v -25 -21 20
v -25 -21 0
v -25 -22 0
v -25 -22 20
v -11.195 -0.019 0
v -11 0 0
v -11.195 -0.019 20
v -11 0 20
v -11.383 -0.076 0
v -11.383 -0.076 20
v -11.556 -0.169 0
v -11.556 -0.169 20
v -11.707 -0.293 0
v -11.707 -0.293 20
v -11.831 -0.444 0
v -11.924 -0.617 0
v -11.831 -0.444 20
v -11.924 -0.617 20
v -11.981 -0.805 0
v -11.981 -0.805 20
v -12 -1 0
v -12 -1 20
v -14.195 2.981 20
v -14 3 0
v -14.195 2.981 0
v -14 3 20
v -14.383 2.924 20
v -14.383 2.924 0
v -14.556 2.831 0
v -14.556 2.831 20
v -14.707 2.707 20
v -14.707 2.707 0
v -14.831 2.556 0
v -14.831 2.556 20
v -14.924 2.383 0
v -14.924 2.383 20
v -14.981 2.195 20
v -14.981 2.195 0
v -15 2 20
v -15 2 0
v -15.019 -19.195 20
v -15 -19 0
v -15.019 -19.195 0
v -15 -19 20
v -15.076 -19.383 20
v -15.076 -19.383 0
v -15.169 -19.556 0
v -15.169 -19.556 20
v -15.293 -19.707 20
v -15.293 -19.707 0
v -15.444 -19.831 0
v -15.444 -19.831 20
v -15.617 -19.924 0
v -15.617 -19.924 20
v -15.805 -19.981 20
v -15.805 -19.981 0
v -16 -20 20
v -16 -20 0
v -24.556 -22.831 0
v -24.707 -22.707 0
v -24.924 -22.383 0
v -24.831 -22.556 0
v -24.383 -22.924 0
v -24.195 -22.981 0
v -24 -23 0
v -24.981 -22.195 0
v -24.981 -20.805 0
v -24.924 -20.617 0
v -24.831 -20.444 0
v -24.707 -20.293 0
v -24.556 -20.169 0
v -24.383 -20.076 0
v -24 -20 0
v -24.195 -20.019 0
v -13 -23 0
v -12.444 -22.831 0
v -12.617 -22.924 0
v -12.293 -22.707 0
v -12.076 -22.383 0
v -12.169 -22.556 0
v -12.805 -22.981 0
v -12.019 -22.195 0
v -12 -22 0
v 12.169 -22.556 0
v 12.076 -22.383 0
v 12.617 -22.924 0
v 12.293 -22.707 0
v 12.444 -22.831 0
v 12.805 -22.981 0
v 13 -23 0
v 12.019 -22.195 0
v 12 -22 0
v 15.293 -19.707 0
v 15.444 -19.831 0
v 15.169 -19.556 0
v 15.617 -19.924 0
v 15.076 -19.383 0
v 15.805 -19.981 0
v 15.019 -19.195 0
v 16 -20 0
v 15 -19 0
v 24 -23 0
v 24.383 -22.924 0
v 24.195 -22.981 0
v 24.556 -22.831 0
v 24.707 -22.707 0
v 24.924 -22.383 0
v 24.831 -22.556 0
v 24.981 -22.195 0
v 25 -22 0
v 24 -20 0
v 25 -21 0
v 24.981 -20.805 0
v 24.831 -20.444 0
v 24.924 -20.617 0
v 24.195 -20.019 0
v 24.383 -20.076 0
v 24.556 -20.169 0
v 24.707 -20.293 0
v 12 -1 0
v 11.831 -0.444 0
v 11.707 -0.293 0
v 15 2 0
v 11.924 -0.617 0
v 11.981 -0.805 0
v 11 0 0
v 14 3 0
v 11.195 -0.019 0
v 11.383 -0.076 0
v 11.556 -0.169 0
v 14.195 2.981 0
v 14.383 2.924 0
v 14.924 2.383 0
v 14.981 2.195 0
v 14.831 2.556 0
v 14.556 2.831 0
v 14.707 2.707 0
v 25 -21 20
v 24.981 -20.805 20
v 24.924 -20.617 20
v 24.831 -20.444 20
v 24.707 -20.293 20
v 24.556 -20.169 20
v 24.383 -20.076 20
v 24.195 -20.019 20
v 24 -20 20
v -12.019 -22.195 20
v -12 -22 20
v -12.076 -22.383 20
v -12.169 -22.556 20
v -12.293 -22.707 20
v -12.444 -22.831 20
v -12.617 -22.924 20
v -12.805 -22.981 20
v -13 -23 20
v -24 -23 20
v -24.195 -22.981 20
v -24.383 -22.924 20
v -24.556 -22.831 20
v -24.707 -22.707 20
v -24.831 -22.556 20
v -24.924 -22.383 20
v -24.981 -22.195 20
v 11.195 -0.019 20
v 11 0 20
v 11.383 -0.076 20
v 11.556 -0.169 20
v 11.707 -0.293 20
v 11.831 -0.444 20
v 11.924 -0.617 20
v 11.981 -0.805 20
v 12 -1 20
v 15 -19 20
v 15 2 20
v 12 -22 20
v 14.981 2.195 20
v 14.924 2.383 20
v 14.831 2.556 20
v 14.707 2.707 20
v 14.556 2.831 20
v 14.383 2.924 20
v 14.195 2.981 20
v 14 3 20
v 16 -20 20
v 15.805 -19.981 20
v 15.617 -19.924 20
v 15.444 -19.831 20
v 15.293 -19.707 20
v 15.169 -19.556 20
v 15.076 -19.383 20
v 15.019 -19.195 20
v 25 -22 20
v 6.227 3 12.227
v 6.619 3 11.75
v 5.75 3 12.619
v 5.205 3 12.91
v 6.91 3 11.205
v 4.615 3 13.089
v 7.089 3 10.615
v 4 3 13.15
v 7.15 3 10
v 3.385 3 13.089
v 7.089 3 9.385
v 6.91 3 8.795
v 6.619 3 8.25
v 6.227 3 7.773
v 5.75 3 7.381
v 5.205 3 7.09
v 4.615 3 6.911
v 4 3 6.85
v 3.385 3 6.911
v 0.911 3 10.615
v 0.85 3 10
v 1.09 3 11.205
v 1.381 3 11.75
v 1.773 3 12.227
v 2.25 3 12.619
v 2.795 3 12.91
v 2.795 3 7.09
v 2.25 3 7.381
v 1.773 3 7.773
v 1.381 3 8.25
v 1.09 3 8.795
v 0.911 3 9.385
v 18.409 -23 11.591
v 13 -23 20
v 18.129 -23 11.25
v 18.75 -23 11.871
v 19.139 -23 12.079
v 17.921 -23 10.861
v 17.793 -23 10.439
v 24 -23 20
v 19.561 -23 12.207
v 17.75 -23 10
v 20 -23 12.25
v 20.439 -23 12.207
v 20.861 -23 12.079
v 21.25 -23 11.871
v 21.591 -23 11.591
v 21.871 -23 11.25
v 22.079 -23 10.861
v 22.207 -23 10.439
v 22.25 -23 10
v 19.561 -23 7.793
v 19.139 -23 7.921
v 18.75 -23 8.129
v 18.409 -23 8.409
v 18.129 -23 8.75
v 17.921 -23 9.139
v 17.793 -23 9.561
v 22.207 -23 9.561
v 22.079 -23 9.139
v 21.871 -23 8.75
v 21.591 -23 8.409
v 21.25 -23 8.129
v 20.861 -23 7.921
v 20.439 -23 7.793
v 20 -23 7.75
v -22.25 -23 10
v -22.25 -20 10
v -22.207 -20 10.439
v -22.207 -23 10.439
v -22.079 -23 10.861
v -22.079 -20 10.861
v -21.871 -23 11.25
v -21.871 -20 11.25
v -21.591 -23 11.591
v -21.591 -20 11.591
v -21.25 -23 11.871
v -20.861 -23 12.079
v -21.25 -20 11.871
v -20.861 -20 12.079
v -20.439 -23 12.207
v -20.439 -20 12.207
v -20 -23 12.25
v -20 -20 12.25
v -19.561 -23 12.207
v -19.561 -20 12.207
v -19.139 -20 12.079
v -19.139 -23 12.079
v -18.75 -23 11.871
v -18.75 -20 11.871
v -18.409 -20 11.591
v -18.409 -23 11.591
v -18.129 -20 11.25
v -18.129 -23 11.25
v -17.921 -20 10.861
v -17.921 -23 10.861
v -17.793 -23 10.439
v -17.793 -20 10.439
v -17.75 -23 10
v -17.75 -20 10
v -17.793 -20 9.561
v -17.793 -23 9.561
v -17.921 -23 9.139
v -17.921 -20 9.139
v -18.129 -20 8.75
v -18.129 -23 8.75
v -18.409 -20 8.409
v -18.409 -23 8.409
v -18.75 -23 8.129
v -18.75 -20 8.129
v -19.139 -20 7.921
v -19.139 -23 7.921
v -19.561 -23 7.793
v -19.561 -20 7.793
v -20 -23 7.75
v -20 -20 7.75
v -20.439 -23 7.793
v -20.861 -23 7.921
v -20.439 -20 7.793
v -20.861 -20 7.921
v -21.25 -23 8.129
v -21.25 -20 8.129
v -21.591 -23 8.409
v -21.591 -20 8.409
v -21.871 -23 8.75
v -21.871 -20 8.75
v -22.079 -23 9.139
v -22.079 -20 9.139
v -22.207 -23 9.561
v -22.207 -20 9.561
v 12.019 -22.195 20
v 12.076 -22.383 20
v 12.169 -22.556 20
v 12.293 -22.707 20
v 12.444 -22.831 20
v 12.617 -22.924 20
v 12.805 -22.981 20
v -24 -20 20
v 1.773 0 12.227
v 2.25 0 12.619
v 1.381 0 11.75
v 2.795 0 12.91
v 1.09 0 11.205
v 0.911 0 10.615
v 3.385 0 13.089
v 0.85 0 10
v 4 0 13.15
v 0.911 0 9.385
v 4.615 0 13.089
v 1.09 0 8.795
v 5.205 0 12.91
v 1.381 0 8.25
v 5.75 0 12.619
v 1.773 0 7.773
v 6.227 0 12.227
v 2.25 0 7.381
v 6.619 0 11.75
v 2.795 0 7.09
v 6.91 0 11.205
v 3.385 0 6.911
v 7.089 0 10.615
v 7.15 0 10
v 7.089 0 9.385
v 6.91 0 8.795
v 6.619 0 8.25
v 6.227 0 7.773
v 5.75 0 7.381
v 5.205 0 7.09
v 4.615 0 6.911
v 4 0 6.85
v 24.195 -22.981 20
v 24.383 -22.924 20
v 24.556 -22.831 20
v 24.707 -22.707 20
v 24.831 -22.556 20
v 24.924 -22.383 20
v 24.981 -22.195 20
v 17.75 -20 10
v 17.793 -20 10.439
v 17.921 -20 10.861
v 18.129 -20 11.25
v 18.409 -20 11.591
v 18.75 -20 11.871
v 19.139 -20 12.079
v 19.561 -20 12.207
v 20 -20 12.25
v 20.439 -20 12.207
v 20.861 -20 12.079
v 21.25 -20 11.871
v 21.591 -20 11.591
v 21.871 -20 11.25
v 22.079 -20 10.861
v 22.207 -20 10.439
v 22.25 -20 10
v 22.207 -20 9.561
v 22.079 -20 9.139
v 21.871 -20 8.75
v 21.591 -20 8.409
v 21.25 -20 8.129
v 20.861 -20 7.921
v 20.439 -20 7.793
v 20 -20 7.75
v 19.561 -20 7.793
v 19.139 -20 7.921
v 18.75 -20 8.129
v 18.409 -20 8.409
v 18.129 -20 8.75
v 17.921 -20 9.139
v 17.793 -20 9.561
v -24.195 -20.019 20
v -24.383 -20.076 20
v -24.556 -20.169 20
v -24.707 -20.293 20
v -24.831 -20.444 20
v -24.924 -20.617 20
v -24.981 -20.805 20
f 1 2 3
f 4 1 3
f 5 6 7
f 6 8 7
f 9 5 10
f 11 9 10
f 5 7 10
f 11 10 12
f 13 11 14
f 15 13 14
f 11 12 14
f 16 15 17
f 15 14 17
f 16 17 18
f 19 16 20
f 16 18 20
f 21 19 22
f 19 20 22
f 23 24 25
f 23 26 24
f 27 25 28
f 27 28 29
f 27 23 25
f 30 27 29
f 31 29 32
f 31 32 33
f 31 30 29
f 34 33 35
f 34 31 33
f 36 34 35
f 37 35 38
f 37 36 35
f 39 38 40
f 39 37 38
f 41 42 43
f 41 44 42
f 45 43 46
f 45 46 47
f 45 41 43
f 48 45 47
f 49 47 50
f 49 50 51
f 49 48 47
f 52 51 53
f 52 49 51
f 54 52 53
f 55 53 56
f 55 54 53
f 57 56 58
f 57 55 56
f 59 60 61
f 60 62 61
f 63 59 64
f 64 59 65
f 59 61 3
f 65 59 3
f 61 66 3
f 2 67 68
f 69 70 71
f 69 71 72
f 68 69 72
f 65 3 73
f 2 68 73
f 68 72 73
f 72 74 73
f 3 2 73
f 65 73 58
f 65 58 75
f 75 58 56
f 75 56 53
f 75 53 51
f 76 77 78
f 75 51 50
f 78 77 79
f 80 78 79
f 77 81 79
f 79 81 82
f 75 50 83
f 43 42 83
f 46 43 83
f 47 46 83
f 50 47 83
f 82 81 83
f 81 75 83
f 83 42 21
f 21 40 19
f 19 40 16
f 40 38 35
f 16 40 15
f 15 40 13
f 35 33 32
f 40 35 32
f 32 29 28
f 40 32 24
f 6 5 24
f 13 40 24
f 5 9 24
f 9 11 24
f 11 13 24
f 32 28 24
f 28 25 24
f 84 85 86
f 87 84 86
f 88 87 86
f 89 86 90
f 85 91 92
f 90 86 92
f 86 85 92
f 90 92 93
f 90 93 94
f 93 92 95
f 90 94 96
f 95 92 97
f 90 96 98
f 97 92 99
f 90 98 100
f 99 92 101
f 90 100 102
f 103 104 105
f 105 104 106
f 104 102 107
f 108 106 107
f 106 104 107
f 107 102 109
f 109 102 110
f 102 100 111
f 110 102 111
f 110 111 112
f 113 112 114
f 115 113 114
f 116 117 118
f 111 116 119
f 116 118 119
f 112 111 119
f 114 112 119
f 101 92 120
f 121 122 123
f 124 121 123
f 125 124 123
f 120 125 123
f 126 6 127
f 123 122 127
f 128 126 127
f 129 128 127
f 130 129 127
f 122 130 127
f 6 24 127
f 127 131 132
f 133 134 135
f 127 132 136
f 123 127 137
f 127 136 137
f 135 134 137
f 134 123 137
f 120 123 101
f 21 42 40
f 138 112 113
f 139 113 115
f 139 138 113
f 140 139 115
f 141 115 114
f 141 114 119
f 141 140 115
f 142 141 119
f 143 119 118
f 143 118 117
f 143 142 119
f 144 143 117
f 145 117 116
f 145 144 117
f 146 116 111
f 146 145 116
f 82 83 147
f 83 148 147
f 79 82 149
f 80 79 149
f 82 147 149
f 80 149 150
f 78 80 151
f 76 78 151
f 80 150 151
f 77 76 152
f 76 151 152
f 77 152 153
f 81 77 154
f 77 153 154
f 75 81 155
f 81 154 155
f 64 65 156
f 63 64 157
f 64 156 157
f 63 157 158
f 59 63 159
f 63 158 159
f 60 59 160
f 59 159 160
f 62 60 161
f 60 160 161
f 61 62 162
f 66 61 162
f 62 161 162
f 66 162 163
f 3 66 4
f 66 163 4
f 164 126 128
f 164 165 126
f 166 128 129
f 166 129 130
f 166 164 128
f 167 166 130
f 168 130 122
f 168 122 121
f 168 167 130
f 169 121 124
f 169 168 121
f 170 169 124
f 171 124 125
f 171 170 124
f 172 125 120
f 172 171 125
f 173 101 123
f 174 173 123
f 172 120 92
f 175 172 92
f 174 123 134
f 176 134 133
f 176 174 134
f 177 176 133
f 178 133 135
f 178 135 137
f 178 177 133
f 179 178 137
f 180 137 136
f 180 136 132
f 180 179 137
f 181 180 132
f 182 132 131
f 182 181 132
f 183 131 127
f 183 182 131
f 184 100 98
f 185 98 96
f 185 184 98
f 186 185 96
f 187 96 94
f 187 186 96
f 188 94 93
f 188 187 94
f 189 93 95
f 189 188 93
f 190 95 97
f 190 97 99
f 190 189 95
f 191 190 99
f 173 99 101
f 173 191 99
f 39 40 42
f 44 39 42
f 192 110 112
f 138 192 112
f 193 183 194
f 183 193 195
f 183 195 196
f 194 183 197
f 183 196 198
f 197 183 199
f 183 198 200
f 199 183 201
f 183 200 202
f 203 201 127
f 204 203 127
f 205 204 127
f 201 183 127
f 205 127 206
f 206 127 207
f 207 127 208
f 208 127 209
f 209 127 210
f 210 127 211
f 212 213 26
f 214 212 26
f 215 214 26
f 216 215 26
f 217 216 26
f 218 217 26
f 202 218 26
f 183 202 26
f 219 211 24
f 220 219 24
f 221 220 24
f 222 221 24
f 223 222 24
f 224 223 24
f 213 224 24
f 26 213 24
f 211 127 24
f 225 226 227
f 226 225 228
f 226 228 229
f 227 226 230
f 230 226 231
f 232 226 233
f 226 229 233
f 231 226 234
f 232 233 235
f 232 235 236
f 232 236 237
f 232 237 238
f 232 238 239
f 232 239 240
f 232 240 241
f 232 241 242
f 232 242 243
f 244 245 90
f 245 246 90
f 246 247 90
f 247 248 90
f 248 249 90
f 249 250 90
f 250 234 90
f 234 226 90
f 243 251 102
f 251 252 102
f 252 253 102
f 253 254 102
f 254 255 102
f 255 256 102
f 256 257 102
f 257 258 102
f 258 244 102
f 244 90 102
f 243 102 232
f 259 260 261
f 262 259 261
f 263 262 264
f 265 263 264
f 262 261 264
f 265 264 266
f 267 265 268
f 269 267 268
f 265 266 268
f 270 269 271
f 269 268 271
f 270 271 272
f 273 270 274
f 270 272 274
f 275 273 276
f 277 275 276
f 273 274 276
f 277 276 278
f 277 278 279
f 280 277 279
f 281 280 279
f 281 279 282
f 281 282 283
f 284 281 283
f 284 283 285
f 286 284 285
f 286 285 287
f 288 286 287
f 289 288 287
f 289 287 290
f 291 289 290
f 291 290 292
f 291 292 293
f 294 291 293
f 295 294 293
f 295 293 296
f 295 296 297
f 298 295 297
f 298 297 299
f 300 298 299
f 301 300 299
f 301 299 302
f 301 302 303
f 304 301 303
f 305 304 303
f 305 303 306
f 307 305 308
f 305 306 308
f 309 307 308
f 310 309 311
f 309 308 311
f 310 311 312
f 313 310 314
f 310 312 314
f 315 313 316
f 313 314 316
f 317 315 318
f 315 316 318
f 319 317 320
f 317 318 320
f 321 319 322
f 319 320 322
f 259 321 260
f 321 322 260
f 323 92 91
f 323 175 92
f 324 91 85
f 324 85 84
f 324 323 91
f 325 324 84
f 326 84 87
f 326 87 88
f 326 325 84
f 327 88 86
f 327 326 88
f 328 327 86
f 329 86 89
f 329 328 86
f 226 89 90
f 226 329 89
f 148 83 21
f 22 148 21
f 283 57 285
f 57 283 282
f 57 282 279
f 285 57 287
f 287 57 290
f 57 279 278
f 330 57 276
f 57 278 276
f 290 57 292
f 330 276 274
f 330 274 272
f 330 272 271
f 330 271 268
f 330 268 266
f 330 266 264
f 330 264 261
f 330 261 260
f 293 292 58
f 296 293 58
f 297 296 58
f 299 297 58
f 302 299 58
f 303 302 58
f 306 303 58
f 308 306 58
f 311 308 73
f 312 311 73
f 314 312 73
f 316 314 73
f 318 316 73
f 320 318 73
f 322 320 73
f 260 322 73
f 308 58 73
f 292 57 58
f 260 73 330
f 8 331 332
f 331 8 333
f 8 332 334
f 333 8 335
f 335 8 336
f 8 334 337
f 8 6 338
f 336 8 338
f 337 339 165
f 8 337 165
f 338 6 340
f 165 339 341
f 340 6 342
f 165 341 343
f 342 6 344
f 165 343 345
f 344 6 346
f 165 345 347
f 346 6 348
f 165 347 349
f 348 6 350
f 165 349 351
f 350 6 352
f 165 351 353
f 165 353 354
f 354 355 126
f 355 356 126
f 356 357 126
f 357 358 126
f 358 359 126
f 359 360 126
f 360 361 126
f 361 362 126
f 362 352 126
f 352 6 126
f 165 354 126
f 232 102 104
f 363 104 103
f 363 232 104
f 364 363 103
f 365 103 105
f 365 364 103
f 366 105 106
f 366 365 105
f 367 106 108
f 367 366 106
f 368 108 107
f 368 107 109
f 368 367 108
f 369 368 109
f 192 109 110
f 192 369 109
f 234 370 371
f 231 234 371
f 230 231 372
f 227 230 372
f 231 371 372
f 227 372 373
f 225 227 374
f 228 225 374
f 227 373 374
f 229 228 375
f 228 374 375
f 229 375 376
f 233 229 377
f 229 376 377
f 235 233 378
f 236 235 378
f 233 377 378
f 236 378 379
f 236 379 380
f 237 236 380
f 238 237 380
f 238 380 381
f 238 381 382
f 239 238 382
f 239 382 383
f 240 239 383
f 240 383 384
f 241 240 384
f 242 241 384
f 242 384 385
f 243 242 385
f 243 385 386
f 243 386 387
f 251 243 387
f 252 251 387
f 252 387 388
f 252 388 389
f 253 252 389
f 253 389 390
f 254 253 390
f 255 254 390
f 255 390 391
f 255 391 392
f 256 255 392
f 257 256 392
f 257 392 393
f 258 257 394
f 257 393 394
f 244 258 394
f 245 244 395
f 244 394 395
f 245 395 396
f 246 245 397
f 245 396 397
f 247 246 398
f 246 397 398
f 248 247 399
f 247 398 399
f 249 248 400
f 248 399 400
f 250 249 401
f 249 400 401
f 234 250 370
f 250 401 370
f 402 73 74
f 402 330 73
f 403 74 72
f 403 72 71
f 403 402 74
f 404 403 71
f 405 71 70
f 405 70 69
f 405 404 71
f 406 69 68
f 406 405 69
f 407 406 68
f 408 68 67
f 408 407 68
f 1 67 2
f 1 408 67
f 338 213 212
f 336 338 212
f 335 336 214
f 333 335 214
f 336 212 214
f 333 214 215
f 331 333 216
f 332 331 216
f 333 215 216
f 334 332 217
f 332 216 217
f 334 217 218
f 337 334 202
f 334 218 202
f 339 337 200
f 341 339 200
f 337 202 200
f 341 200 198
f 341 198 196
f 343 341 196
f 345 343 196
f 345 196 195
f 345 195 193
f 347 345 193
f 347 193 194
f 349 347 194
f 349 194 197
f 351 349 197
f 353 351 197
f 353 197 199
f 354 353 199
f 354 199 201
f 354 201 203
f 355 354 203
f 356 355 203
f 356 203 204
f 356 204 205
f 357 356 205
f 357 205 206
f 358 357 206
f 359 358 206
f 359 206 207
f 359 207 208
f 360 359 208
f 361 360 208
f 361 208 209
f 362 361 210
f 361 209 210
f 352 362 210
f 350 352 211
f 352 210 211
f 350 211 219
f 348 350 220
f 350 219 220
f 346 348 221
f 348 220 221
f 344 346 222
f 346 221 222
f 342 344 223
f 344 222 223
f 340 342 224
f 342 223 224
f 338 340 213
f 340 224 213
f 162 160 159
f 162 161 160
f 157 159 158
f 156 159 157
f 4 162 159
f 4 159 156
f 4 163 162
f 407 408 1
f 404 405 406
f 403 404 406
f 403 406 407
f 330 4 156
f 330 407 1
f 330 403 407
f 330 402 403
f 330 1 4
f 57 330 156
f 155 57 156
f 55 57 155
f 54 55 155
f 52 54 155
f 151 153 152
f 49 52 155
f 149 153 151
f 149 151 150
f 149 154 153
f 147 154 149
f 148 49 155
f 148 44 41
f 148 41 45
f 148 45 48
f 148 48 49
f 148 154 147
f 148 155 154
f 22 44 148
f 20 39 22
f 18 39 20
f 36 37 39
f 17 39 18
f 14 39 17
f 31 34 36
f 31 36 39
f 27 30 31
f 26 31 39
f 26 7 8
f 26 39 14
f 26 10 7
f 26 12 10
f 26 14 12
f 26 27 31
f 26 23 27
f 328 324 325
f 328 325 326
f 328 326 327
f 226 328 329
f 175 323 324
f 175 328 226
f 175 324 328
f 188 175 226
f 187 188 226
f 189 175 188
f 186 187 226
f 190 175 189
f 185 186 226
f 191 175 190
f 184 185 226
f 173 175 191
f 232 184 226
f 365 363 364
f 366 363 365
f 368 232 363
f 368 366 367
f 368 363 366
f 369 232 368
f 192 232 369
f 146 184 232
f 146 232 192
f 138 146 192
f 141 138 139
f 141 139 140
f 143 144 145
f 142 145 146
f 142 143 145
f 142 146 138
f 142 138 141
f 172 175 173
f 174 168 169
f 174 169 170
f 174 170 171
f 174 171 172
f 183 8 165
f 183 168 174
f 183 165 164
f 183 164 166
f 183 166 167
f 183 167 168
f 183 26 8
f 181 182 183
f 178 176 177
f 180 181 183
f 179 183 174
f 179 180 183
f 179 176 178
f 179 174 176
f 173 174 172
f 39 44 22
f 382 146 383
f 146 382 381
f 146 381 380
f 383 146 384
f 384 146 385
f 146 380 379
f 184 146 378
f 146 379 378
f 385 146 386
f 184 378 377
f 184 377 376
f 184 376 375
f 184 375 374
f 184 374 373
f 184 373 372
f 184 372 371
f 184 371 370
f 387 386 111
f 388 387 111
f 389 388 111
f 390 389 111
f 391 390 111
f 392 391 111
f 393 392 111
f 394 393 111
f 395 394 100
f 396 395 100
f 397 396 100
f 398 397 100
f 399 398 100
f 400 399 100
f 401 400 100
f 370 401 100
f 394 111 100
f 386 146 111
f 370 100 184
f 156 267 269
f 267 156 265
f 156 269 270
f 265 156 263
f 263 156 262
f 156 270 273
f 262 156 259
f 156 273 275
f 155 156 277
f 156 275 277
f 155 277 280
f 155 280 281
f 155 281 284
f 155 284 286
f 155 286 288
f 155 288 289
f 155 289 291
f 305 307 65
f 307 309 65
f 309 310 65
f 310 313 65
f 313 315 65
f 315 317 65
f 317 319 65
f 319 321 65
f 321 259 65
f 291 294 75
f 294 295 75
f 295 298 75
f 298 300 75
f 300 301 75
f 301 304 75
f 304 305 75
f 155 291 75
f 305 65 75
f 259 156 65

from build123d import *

# Parameters (mm, degrees)
BOSS_EXTRUDE1_DEPTH = 20
SKETCH3_R           = 3.15
CUT_EXTRUDE1_DEPTH  = 42.243181255
SKETCH5_R           = 2.25
CUT_EXTRUDE2_DEPTH  = 40.420806689
FILLET1_R           = 1


with BuildPart() as part:
    # Sketch2 → Boss-Extrude1 (new body)
    with BuildSketch(Plane.XY):
        Polygon((-12, 0), (12, 0), (12, -23), (25, -23), (25, -20), (15, -20), (15, 3), (-15, 3), (-15, -20), (-25, -20), (-25, -23), (-12, -23), align=None)
    extrude(amount=BOSS_EXTRUDE1_DEPTH)

    # Sketch3 → Cut-Extrude1 (cut, through all)
    with BuildSketch(Plane(origin=(0, 3, 0), x_dir=(1, 0, 0), z_dir=(0, 1, 0))):
        with Locations(Location((4, -10, 0), (0, 0, 180))):
            Circle(SKETCH3_R)
    extrude(amount=-CUT_EXTRUDE1_DEPTH, mode=Mode.SUBTRACT)

    # Sketch5 → Cut-Extrude2 (cut, through all)
    with BuildSketch(Plane(origin=(0, -20, 0), x_dir=(1, 0, 0), z_dir=(0, 1, 0))):
        with Locations(Location((-20, -10, 0), (0, 0, 180))):
            Circle(SKETCH5_R)
        with Locations(Location((20, -10, 0), (0, 0, 180))):
            Circle(SKETCH5_R)
    extrude(amount=-CUT_EXTRUDE2_DEPTH, mode=Mode.SUBTRACT)

    # Fillet1
    fillet1_edges = [part.edges().sort_by_distance(p)[0] for p in [
        (15, -20, 10),
        (25, -20, 10),
        (25, -23, 10),
        (12, -23, 10),
        (12, 0, 10),
        (-12, 0, 10),
        (-12, -23, 10),
        (-25, -23, 10),
        (-25, -20, 10),
        (-15, -20, 10),
        (-15, 3, 10),
        (15, 3, 10),
    ]]
    fillet(fillet1_edges, radius=FILLET1_R)


solid = part.part
